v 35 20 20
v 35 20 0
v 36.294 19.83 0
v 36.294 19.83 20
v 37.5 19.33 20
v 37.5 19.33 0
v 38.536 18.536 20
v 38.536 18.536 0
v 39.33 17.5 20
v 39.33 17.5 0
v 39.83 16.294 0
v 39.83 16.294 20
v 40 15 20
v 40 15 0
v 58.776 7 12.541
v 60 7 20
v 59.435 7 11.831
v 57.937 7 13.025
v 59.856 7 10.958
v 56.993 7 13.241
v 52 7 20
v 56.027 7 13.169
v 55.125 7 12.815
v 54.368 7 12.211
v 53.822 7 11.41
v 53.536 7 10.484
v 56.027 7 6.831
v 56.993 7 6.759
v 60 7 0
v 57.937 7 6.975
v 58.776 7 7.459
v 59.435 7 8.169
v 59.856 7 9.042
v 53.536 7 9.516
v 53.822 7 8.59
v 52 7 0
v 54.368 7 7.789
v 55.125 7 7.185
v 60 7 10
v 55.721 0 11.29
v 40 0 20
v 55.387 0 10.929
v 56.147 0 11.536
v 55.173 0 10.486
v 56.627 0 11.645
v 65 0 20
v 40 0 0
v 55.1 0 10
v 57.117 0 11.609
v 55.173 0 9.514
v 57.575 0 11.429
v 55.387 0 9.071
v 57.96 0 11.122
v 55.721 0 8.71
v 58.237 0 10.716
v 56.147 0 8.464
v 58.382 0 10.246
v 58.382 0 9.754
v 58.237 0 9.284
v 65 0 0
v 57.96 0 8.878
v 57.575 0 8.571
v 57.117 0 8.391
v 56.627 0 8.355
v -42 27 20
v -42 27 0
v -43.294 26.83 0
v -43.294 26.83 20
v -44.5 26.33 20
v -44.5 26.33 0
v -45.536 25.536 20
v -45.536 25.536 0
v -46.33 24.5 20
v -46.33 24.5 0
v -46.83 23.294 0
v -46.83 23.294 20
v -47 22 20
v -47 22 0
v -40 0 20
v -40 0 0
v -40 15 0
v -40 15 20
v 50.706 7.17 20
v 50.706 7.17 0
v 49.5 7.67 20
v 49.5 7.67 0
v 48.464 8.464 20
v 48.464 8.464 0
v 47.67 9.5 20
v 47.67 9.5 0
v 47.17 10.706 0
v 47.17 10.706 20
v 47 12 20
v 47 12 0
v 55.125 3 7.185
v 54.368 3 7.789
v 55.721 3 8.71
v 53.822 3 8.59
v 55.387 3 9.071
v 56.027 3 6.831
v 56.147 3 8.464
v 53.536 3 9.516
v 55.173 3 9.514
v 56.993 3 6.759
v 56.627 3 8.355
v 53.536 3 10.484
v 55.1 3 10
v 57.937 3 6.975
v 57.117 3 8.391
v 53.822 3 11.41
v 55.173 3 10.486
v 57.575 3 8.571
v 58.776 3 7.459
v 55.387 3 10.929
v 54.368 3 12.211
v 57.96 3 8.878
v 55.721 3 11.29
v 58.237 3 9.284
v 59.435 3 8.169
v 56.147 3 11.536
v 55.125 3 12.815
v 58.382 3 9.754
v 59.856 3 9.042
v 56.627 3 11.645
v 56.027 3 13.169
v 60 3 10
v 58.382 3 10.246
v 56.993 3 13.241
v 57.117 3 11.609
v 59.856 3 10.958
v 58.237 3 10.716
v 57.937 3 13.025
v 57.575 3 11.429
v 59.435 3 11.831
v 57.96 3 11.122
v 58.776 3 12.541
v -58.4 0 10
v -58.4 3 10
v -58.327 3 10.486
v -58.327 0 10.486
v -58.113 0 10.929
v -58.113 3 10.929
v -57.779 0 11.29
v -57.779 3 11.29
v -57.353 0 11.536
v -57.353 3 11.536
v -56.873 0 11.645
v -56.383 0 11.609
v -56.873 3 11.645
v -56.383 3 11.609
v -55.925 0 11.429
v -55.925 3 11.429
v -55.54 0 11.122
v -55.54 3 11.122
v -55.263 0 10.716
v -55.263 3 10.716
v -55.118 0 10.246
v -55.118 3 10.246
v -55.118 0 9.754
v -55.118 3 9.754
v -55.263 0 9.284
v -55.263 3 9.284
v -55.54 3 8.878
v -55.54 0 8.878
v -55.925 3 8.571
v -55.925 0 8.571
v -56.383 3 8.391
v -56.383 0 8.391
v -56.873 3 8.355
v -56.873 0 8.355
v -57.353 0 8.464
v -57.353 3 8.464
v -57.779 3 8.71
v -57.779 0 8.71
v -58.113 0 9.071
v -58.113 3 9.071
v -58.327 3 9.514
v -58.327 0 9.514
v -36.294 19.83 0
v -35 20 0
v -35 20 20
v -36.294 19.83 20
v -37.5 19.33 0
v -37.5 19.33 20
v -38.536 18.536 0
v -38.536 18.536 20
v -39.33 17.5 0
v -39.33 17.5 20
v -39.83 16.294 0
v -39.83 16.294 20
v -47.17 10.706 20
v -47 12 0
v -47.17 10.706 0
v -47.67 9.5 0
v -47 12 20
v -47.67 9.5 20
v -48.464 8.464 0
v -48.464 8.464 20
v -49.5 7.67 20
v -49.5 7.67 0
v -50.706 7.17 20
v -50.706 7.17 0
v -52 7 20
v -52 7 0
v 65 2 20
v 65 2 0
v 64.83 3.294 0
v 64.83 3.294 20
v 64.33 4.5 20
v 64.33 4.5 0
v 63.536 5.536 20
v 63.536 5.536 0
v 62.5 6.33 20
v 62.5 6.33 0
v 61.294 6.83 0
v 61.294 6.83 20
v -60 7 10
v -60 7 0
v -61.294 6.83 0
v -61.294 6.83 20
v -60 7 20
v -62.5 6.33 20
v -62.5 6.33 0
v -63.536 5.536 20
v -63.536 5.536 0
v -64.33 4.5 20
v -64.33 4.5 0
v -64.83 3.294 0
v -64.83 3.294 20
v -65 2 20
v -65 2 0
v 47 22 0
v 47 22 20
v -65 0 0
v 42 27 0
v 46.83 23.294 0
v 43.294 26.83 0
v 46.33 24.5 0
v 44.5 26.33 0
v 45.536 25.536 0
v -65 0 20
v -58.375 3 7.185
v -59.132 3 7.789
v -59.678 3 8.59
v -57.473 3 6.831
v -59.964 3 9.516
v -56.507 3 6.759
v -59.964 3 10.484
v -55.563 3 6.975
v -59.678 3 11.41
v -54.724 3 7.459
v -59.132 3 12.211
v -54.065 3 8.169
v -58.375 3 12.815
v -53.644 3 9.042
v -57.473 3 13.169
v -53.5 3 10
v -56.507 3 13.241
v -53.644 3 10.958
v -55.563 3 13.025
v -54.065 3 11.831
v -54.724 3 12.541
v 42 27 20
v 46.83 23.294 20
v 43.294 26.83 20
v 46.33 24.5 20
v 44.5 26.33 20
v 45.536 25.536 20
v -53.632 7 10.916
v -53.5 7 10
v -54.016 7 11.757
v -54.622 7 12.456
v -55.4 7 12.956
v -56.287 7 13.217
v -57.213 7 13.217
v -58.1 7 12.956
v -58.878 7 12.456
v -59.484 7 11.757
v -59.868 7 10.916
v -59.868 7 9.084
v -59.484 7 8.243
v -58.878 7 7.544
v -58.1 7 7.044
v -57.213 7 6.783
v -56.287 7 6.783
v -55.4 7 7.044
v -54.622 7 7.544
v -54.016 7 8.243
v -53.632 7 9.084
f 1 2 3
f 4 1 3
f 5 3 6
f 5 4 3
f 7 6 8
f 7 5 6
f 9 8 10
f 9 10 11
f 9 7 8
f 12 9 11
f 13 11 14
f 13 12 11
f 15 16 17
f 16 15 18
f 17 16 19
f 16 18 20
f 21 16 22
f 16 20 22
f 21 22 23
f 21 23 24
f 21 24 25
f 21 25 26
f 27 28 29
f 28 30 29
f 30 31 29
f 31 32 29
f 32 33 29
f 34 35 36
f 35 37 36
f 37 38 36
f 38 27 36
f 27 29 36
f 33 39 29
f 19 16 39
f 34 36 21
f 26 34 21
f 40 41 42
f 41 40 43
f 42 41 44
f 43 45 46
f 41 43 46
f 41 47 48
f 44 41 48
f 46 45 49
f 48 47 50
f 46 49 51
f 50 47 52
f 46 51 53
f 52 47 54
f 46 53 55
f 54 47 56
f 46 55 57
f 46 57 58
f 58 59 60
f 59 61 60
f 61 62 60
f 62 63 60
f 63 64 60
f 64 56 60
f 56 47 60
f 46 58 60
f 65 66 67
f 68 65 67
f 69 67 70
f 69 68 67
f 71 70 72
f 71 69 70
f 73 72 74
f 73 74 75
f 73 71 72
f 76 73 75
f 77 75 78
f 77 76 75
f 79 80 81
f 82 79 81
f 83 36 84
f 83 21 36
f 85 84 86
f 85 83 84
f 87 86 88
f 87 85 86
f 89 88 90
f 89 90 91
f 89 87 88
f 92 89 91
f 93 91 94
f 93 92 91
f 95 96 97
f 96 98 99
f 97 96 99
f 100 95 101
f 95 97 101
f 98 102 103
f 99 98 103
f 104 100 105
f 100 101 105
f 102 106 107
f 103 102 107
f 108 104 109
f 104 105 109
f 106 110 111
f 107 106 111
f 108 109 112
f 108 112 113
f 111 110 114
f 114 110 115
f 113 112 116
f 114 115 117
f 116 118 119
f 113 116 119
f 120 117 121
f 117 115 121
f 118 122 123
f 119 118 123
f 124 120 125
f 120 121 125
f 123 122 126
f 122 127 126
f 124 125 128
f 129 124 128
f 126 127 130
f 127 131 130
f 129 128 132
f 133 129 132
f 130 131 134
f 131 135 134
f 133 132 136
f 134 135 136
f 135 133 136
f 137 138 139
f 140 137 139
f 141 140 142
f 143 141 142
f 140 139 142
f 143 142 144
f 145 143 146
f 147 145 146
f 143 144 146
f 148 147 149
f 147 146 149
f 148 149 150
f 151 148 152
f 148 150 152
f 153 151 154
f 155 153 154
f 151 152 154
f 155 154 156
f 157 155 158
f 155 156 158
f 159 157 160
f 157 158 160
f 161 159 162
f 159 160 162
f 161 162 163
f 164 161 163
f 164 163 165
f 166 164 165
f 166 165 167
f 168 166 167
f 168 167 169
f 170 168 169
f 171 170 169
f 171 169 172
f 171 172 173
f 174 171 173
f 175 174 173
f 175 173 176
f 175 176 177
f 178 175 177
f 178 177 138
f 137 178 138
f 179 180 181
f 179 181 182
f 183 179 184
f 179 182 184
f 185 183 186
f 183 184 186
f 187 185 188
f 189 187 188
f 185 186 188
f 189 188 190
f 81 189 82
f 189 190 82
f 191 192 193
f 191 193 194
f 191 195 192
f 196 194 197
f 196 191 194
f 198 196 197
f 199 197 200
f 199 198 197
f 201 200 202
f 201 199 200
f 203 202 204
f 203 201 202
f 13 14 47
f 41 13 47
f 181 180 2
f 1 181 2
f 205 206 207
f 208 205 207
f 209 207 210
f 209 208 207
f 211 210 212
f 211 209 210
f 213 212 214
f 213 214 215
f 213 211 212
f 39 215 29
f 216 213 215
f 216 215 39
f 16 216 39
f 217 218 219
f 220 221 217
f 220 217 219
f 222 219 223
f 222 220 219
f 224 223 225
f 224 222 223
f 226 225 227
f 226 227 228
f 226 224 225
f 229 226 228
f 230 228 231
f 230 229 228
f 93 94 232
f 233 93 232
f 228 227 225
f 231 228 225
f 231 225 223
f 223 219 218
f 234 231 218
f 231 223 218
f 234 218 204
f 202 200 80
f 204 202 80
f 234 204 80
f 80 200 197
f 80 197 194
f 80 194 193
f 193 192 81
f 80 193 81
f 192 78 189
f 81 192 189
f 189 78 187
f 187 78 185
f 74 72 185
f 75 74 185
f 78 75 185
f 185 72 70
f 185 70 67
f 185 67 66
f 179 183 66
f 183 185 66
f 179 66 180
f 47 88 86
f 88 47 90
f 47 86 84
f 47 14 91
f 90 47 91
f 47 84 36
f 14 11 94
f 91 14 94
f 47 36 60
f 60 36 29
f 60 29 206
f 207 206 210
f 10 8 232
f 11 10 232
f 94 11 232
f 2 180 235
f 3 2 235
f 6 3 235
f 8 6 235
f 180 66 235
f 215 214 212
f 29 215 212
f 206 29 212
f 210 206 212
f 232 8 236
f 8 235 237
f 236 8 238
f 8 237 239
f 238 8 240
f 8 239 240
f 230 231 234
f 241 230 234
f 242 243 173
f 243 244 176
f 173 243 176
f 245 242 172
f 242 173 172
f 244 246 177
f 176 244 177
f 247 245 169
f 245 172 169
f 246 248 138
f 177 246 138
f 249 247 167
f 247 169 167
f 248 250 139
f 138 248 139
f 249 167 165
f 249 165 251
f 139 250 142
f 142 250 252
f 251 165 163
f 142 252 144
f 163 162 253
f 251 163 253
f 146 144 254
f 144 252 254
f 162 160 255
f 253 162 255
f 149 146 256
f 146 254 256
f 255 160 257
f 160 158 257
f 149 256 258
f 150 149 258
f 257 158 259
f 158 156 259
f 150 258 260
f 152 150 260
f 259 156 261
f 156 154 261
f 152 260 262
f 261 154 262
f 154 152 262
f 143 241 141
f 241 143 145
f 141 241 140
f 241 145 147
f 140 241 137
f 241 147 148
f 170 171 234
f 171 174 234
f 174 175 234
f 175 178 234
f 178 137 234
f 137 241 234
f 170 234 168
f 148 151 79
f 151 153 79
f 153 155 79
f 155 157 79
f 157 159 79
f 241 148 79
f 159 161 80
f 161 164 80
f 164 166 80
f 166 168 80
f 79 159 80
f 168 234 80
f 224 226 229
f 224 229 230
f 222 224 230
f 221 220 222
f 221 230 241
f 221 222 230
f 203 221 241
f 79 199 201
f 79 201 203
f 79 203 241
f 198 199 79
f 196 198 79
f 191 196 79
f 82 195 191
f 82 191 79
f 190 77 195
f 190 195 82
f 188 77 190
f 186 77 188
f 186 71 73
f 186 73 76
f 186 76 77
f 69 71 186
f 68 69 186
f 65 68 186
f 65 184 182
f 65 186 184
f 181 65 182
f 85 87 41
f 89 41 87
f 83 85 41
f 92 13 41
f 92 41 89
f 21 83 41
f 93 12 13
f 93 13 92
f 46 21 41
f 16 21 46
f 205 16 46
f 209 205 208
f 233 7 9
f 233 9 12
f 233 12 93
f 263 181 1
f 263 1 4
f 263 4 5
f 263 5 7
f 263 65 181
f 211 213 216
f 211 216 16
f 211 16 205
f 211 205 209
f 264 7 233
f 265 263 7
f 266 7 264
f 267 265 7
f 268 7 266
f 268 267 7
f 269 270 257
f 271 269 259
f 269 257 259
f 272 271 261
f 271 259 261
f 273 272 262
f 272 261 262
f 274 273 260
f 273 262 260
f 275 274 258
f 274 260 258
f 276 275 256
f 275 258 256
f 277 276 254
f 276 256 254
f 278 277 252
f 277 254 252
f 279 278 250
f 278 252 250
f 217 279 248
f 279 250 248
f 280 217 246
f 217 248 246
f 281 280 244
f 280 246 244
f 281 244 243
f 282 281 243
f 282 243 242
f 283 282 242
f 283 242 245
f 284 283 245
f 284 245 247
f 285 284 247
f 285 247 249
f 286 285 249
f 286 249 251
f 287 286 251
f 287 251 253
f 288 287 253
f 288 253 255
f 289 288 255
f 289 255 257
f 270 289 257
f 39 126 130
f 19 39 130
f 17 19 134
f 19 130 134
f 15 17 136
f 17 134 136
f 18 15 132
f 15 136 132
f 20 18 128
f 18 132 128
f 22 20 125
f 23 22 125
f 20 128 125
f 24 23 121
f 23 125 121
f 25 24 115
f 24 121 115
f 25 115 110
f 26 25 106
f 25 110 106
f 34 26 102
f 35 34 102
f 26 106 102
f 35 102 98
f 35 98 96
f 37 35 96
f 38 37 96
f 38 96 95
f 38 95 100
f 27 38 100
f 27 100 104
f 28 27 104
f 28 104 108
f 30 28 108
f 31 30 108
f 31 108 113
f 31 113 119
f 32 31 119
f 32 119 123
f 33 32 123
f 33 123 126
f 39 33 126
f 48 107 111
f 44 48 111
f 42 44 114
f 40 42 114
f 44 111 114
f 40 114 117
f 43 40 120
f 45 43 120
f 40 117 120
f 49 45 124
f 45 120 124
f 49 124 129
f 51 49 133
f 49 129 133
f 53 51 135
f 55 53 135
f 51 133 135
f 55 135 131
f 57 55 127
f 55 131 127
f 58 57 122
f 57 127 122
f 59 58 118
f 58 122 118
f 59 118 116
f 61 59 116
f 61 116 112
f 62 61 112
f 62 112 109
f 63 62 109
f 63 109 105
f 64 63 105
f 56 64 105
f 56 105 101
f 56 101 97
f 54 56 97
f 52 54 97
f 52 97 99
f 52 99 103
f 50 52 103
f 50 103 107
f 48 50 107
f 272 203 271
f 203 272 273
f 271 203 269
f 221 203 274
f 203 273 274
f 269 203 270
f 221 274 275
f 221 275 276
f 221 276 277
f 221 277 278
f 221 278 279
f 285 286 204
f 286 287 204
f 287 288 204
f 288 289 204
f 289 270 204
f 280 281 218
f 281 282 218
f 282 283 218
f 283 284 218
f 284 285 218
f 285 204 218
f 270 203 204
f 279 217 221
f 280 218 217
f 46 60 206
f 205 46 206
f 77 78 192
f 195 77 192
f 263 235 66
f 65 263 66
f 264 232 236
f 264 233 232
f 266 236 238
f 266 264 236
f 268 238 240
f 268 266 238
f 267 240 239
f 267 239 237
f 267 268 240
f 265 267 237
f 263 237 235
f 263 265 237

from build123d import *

# Parameters (mm, degrees)
F1_DEPTH = 20
F2_R     = 5
F4_R     = 3.25
F5_DEPTH = 25
F6_R     = 1.65
F7_DEPTH = 25


with BuildPart() as f1:
    # F0 (on Top) → F1 (new body)
    with BuildSketch(Plane.XY):
        Polygon((-40, 20), (0, 20), (40, 20), (40, 0), (65, 0), (65, 7), (47, 7), (47, 27), (0, 27), (-47, 27), (-47, 7), (-65, 7), (-65, 0), (-40, 0), align=None)
    extrude(amount=F1_DEPTH)

    # F2
    f2_edges = [f1.edges().sort_by_distance(p)[0] for p in [
        (40, 20, 10),
        (47, 27, 10),
        (-40, 20, 10),
        (-47, 27, 10),
        (47, 7, 10),
        (-47, 7, 10),
        (65, 7, 10),
        (-65, 7, 10),
    ]]
    fillet(f2_edges, radius=F2_R)

    # F4 (on offset) → F5 (cut)
    with BuildSketch(Plane.XZ.offset(-3)):
        with Locations((-56.75, 10)):
            Circle(F4_R)
        with Locations((56.75, 10)):
            Circle(F4_R)
    extrude(amount=-F5_DEPTH, mode=Mode.SUBTRACT)

    # F6 (on face) → F7 (cut)
    with BuildSketch(Plane(origin=(0, 3, 0), x_dir=(-1, 0, 0), z_dir=(0, 1, 0))):
        with Locations((-56.75, 10)):
            Circle(F6_R)
        with Locations((56.75, 10)):
            Circle(F6_R)
    extrude(amount=-F7_DEPTH, mode=Mode.SUBTRACT)


solid = f1.part
